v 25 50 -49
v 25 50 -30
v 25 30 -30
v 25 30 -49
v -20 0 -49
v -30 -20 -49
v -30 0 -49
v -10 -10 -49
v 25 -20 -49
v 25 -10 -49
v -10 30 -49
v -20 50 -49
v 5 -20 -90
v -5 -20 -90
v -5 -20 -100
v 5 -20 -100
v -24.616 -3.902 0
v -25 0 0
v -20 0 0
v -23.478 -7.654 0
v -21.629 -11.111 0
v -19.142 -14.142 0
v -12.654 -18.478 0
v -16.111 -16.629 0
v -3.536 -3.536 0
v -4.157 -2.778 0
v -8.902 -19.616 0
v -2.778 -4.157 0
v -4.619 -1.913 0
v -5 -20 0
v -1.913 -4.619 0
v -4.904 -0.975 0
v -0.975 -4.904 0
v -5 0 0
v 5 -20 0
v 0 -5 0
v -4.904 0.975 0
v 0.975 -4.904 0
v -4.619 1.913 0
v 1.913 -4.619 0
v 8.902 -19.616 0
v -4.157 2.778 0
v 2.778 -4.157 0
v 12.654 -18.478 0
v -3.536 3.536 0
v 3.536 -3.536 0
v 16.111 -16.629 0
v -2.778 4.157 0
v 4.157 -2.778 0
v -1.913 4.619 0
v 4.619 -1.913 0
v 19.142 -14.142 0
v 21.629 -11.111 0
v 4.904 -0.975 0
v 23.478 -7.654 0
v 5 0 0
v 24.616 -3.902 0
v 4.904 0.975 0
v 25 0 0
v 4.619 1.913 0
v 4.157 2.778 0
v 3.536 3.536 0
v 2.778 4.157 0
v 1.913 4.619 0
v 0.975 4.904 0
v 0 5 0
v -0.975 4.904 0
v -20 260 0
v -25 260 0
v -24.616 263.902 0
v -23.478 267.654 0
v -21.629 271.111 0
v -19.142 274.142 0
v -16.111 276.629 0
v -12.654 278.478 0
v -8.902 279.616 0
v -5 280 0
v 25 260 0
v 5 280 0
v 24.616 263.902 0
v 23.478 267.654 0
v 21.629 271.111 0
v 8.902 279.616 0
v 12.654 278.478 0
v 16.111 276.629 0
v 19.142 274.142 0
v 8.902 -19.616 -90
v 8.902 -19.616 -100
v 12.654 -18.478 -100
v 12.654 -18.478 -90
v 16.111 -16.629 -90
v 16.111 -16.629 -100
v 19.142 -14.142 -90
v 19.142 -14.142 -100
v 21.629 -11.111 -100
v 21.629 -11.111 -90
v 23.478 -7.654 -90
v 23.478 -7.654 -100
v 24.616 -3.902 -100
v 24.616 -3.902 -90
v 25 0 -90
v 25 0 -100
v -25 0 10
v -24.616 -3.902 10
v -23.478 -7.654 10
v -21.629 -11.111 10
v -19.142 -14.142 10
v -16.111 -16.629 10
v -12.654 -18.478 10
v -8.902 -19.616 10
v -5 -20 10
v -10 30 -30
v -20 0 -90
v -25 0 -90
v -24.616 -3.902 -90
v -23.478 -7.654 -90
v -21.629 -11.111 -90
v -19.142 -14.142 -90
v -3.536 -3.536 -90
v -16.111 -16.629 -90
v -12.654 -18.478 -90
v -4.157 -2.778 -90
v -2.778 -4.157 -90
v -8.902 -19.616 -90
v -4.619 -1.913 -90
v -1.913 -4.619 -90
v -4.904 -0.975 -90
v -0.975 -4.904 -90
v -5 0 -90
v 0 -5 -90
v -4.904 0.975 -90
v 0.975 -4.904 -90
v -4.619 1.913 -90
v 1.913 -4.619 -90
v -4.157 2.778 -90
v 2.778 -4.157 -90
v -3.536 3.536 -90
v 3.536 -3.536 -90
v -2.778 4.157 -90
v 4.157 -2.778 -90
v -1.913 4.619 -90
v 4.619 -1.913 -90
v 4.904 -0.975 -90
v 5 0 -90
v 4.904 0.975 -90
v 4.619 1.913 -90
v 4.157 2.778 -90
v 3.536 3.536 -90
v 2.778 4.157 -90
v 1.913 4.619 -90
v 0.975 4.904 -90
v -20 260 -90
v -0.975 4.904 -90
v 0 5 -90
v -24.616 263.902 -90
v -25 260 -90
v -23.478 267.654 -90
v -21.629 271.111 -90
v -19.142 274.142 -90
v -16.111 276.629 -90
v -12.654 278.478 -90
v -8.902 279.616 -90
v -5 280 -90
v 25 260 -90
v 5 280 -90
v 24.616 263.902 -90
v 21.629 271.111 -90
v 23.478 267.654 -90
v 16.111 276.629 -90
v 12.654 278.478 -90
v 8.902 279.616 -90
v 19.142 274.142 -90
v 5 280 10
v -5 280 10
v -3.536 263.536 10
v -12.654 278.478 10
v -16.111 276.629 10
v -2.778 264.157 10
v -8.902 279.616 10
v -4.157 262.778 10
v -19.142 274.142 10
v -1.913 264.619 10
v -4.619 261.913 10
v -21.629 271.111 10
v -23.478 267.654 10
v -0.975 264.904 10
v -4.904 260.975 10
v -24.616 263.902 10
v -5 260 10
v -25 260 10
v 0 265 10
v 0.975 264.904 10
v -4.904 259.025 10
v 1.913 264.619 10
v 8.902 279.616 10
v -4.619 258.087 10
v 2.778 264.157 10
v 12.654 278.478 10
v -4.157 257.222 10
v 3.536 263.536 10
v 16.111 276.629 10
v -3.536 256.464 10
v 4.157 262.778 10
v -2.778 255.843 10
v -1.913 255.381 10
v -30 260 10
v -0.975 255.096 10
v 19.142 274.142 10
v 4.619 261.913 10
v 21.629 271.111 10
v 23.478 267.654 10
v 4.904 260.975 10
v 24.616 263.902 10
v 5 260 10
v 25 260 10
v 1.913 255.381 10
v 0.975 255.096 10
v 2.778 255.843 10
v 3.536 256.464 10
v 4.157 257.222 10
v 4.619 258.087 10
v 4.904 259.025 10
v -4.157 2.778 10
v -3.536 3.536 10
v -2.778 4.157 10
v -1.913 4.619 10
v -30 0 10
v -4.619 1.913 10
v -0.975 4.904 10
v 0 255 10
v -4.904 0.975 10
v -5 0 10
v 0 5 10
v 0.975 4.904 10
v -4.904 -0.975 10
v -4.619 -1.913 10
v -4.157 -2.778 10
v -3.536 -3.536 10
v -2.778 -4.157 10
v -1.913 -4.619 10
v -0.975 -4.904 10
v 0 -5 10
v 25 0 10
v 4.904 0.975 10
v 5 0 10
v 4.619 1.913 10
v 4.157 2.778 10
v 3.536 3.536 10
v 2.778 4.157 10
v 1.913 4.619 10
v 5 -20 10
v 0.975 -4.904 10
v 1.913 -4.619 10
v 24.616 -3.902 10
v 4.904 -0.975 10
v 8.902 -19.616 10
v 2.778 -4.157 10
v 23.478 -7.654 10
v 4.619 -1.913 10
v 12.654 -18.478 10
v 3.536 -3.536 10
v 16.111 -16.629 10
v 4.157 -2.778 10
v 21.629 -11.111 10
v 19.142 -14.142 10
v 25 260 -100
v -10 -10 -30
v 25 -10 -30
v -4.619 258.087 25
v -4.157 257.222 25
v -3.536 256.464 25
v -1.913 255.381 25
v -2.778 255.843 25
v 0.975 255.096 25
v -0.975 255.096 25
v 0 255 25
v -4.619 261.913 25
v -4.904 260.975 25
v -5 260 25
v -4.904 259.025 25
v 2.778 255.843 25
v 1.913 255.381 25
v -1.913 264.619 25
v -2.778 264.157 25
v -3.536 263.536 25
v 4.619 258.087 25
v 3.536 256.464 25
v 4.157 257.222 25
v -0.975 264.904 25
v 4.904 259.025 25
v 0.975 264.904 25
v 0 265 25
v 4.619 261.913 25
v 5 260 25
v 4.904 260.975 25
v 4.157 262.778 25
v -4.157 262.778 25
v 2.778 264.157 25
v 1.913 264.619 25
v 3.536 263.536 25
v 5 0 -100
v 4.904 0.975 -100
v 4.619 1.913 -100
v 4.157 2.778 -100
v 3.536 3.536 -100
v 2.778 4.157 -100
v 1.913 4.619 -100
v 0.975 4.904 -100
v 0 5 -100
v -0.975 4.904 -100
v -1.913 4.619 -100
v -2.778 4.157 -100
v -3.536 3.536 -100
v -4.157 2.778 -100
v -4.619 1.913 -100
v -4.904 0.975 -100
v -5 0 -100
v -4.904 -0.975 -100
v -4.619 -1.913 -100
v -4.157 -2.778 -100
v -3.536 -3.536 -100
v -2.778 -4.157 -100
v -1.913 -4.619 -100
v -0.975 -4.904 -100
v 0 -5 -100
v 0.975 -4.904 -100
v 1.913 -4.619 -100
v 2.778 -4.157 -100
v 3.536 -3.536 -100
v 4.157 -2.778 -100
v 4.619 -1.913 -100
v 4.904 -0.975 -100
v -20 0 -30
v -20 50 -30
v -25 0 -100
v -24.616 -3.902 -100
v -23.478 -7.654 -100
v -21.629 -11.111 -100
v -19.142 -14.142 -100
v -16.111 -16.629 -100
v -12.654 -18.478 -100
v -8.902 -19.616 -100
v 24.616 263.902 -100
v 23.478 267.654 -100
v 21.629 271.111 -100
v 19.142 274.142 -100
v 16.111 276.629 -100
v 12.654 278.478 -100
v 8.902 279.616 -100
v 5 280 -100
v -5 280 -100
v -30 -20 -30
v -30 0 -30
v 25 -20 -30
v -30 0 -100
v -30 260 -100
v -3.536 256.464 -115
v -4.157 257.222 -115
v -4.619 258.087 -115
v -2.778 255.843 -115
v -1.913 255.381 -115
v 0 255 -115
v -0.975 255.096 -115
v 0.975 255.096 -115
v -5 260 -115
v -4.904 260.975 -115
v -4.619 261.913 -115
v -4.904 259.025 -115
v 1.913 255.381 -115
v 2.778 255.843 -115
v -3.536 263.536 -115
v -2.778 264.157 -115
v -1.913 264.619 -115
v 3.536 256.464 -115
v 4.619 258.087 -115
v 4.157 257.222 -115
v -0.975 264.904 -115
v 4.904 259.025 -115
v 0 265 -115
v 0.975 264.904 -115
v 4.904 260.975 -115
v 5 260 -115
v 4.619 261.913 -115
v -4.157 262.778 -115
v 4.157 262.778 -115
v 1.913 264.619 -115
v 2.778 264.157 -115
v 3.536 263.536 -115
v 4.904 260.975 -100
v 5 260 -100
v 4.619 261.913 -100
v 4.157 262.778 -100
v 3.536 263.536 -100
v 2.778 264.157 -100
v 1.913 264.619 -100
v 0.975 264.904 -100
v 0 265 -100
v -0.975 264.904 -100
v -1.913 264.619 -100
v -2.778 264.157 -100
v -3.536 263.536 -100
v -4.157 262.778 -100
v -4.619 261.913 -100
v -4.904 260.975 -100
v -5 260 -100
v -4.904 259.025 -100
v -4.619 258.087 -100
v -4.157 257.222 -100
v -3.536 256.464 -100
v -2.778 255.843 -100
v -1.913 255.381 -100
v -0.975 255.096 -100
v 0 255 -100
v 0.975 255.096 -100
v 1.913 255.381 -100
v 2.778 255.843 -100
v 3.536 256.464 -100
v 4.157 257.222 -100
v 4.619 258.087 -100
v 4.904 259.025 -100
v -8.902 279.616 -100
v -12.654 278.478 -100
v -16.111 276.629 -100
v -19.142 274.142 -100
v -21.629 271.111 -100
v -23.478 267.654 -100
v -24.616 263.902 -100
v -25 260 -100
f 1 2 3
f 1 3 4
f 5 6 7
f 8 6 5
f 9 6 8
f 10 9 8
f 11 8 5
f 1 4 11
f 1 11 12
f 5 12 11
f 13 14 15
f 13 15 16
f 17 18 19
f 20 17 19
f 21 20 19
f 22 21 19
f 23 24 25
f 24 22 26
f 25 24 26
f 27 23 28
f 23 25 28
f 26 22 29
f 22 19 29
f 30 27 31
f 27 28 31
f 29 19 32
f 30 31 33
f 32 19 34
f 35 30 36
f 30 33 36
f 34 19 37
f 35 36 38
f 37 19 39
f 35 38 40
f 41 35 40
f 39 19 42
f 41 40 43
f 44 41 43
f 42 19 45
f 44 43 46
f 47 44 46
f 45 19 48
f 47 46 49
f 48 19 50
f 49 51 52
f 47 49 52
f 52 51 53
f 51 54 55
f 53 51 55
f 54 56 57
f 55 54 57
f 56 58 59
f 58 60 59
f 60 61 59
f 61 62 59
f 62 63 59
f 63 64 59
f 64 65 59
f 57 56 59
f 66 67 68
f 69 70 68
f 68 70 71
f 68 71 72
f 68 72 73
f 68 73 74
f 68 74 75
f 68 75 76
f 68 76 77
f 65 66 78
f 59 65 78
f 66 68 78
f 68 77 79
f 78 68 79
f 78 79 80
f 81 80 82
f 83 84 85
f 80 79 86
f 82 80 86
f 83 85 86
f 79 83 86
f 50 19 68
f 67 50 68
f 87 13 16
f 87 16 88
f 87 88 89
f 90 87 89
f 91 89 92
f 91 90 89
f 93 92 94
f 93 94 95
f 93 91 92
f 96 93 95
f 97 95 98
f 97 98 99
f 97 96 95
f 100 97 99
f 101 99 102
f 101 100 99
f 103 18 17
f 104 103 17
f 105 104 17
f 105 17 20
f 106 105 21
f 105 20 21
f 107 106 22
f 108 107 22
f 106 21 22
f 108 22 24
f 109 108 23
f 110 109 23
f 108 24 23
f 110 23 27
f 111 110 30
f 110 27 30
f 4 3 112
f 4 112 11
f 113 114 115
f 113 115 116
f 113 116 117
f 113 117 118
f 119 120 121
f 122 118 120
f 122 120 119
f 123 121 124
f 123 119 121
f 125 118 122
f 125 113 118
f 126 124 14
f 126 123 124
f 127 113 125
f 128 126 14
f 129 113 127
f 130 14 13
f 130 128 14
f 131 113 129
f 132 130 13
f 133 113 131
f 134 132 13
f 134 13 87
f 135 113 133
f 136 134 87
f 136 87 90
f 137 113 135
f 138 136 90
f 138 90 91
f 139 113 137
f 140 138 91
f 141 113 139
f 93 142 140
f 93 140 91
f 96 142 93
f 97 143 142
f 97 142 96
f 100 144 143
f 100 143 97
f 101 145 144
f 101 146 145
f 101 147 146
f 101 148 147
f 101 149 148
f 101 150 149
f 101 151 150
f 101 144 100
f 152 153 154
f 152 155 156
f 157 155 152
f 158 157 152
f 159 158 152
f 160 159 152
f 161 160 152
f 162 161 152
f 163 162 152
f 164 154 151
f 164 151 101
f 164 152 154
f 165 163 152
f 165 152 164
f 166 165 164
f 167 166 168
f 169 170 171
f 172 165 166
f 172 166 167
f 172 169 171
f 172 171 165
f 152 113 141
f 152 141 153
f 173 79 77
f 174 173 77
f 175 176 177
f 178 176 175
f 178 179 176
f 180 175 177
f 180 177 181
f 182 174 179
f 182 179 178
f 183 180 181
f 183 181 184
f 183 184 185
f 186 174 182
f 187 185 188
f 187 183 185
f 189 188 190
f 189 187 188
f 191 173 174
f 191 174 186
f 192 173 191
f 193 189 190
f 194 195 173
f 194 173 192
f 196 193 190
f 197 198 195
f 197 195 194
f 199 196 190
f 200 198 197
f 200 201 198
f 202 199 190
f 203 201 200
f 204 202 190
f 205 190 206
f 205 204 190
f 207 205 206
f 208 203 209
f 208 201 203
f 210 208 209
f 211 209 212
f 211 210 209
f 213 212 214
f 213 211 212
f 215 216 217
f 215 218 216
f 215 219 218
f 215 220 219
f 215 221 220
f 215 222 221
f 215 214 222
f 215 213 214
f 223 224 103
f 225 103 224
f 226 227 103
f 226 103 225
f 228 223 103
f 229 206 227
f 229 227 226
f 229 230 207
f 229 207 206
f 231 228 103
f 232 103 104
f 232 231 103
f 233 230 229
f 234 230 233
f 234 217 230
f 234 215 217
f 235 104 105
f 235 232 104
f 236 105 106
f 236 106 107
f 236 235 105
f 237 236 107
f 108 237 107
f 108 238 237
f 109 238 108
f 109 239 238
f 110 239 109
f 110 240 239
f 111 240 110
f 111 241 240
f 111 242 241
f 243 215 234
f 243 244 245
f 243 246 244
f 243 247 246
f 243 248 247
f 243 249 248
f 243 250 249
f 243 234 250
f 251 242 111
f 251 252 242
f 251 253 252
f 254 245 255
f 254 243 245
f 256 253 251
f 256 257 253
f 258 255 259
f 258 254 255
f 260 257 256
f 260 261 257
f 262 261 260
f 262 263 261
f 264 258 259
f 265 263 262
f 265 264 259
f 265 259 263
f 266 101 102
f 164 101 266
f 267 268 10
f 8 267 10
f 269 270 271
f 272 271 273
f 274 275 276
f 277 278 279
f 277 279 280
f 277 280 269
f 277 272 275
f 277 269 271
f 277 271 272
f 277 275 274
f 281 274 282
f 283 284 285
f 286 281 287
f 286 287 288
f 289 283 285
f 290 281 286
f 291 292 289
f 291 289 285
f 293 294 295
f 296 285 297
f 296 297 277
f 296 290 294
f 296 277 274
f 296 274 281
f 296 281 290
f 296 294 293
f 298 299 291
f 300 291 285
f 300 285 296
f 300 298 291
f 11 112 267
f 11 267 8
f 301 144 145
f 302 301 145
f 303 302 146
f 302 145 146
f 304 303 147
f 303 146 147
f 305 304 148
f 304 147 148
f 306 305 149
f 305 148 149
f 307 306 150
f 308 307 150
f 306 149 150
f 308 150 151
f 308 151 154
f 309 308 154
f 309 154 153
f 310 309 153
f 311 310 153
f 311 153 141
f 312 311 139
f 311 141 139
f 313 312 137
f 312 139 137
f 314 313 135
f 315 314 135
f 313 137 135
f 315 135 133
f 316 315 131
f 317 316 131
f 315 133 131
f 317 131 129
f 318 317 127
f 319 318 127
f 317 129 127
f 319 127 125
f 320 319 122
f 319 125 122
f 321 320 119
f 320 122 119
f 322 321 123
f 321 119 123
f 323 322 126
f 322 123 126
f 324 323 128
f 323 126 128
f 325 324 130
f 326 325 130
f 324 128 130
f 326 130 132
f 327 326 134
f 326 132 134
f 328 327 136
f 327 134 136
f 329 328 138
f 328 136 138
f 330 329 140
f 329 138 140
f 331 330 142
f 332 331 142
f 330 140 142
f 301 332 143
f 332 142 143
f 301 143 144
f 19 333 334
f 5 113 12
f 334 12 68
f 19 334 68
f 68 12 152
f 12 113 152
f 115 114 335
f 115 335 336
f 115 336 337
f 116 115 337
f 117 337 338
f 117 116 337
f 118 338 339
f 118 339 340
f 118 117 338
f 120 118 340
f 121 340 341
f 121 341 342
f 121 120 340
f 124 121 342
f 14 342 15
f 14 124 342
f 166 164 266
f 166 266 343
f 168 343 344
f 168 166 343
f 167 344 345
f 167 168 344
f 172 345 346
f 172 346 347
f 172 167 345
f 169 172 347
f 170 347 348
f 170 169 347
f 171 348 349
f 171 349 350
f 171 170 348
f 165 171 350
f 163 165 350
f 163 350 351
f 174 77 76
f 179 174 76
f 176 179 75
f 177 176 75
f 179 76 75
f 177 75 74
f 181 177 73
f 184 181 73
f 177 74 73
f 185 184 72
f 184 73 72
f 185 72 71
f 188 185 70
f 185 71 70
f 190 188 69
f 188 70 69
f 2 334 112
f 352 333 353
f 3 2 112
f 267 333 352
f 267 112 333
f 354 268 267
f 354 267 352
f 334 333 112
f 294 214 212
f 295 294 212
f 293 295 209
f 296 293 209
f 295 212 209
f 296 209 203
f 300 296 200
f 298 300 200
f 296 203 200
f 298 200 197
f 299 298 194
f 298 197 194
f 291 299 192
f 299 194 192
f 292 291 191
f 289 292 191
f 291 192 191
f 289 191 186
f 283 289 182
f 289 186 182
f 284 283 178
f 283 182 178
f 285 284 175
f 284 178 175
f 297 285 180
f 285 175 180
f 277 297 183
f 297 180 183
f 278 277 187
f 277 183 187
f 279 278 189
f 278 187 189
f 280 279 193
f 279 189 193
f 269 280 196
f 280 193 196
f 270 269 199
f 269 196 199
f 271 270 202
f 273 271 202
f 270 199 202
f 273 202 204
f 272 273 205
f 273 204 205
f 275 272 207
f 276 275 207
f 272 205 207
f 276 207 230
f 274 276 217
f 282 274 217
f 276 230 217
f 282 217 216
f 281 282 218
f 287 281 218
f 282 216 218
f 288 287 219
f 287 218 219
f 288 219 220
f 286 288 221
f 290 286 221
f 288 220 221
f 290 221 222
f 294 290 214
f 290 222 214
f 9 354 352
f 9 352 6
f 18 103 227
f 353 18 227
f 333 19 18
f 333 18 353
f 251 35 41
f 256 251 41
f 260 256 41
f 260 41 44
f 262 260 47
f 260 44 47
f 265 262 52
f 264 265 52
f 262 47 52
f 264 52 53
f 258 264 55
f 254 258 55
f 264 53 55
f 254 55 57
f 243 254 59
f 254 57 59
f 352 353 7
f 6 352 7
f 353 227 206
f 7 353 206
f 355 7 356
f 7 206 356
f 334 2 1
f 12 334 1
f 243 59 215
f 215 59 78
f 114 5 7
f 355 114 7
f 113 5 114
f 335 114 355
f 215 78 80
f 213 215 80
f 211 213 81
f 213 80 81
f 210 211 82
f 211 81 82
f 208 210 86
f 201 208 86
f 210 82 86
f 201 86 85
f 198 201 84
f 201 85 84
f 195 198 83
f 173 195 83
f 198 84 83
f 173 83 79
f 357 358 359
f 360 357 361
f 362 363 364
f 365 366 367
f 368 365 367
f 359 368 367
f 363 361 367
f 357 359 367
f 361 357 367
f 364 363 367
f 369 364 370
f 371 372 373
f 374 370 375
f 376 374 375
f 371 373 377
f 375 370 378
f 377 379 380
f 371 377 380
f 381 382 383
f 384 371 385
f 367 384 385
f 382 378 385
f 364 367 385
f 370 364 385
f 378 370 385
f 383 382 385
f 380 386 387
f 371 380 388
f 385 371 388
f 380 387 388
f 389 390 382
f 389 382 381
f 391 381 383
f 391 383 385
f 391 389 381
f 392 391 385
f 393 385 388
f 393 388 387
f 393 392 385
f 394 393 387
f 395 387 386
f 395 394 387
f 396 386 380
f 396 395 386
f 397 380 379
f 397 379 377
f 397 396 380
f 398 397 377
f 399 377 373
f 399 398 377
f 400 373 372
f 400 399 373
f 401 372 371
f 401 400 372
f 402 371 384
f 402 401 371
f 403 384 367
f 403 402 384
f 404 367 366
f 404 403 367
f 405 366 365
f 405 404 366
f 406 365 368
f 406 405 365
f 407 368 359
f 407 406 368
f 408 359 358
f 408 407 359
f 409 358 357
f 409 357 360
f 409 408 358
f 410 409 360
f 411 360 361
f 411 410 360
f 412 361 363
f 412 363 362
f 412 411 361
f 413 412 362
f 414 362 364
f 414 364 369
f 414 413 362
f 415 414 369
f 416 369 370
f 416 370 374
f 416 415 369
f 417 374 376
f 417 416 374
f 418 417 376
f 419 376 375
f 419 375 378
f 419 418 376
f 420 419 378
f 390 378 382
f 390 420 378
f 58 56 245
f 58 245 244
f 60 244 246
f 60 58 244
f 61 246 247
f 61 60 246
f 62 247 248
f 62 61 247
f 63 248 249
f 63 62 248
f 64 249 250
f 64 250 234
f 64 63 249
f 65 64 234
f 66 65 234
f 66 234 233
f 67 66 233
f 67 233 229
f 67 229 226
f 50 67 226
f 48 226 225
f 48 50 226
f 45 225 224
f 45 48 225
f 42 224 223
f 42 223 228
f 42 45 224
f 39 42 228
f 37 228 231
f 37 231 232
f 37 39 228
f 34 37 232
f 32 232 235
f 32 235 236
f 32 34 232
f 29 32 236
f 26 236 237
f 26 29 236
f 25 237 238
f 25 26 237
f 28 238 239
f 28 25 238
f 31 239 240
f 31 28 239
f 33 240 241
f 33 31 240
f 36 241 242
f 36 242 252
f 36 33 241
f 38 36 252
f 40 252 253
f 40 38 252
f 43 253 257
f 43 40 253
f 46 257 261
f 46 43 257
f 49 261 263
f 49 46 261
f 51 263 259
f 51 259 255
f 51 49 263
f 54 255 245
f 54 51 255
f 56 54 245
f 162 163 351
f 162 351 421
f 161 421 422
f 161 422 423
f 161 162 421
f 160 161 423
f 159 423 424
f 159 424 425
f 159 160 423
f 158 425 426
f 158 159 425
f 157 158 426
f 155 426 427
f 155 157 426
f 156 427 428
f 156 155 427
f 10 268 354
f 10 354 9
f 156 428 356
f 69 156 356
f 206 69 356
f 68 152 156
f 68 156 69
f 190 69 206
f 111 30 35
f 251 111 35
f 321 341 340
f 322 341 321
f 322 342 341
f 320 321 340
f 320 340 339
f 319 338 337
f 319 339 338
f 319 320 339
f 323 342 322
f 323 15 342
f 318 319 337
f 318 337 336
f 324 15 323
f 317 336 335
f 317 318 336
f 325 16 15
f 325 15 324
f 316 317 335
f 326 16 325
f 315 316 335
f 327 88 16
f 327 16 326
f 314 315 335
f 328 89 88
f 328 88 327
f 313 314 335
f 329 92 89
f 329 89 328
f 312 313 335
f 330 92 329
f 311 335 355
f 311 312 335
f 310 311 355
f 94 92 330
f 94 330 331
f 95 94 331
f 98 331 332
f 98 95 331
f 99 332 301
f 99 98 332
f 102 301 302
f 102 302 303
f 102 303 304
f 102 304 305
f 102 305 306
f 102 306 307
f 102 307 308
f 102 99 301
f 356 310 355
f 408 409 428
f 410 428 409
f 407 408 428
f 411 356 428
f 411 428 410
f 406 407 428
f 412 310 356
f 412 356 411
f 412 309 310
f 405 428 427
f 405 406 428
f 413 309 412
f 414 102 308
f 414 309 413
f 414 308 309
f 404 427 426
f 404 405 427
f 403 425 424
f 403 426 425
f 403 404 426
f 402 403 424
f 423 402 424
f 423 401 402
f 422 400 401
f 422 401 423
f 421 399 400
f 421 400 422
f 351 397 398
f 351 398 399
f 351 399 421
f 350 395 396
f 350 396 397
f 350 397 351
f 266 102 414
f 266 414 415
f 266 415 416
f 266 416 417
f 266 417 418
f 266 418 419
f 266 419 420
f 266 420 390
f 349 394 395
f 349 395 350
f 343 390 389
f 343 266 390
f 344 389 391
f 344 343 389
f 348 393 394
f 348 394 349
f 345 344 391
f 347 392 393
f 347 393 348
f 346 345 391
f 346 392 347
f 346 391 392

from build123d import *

# Parameters (mm, degrees)
SKETCH1_R           = 5
BOSS_EXTRUDE1_DEPTH = 10
SKETCH2_R           = 5
BOSS_EXTRUDE2_DEPTH = 15
SKETCH3_W           = 5
SKETCH3_H           = 260
BOSS_EXTRUDE3_DEPTH = 45
SKETCH8_W           = 5
SKETCH8_H           = 19
BOSS_EXTRUDE4_DEPTH = 20
SKETCH9_W           = 19
SKETCH9_H           = 10
SKETCH9_H_2         = 20
BOSS_EXTRUDE5_DEPTH = 45
SKETCH10_W          = 19
SKETCH10_H          = 40
BOSS_EXTRUDE6_DEPTH = 10
BOSS_EXTRUDE7_DEPTH = 5


with BuildPart() as part:
    # Sketch1 → Boss-Extrude1 (new body)
    with BuildSketch(Plane.XY):
        with BuildLine():
            Line((-5, -20), (5, -20))
            ThreePointArc((5, -20), (19.142135624, -14.142135624), (25, 0))
            Line((25, 0), (25, 260))
            ThreePointArc((25, 260), (19.142135624, 274.142135624), (5, 280))
            Line((5, 280), (-5, 280))
            ThreePointArc((-5, 280), (-19.142135624, 274.142135624), (-25, 260))
            Line((-25, 260), (-25, 0))
            ThreePointArc((-25, 0), (-19.142135624, -14.142135624), (-5, -20))
        make_face()
        Circle(SKETCH1_R, mode=Mode.SUBTRACT)
    boss_extrude1 = extrude(amount=BOSS_EXTRUDE1_DEPTH)

    # Sketch2 → Boss-Extrude2 (add)
    with BuildSketch(Plane.XY.offset(10)):
        with Locations((0, 260)):
            Circle(SKETCH2_R)
    boss_extrude2 = extrude(amount=BOSS_EXTRUDE2_DEPTH)

    # Sketch3 → Boss-Extrude3 (add)
    with BuildSketch(Plane(origin=(0, 0, 0), x_dir=(-1, 0, 0), z_dir=(0, 0, -1))):
        with Locations((22.5, 130)):
            Rectangle(SKETCH3_W, SKETCH3_H)
    boss_extrude3 = extrude(amount=BOSS_EXTRUDE3_DEPTH)

    # Mirror1: Boss-Extrude1, Boss-Extrude2, Boss-Extrude3 across plane
    add(boss_extrude1.mirror(Plane.XY.offset(-45)))
    add(boss_extrude2.mirror(Plane.XY.offset(-45)))
    add(boss_extrude3.mirror(Plane.XY.offset(-45)))

    # Sketch8 → Boss-Extrude4 (add)
    with BuildSketch(Plane.XZ):
        with Locations((-22.5, -39.5)):
            Rectangle(SKETCH8_W, SKETCH8_H)
    extrude(amount=BOSS_EXTRUDE4_DEPTH)

    # Sketch9 → Boss-Extrude5 (add)
    with BuildSketch(Plane(origin=(-20, 0, 0), x_dir=(0, 0, -1), z_dir=(1, 0, 0))):
        with Locations((39.5, -15)):
            Rectangle(SKETCH9_W, SKETCH9_H)
        with Locations((39.5, 40)):
            Rectangle(SKETCH9_W, SKETCH9_H_2)
    extrude(amount=BOSS_EXTRUDE5_DEPTH)

    # Sketch10 → Boss-Extrude6 (add)
    with BuildSketch(Plane(origin=(-20, 0, 0), x_dir=(0, 0, -1), z_dir=(1, 0, 0))):
        with Locations((39.5, 10)):
            Rectangle(SKETCH10_W, SKETCH10_H)
    extrude(amount=BOSS_EXTRUDE6_DEPTH)

    # Sketch11 → Boss-Extrude7 (add)
    with BuildSketch(Plane.ZY.offset(25)):
        Polygon((10, 0), (-30, 0), (-30, -20), (-49, -20), (-49, 0), (-100, 0), (-100, 260), (10, 260), align=None)
    extrude(amount=BOSS_EXTRUDE7_DEPTH)


solid = part.part
